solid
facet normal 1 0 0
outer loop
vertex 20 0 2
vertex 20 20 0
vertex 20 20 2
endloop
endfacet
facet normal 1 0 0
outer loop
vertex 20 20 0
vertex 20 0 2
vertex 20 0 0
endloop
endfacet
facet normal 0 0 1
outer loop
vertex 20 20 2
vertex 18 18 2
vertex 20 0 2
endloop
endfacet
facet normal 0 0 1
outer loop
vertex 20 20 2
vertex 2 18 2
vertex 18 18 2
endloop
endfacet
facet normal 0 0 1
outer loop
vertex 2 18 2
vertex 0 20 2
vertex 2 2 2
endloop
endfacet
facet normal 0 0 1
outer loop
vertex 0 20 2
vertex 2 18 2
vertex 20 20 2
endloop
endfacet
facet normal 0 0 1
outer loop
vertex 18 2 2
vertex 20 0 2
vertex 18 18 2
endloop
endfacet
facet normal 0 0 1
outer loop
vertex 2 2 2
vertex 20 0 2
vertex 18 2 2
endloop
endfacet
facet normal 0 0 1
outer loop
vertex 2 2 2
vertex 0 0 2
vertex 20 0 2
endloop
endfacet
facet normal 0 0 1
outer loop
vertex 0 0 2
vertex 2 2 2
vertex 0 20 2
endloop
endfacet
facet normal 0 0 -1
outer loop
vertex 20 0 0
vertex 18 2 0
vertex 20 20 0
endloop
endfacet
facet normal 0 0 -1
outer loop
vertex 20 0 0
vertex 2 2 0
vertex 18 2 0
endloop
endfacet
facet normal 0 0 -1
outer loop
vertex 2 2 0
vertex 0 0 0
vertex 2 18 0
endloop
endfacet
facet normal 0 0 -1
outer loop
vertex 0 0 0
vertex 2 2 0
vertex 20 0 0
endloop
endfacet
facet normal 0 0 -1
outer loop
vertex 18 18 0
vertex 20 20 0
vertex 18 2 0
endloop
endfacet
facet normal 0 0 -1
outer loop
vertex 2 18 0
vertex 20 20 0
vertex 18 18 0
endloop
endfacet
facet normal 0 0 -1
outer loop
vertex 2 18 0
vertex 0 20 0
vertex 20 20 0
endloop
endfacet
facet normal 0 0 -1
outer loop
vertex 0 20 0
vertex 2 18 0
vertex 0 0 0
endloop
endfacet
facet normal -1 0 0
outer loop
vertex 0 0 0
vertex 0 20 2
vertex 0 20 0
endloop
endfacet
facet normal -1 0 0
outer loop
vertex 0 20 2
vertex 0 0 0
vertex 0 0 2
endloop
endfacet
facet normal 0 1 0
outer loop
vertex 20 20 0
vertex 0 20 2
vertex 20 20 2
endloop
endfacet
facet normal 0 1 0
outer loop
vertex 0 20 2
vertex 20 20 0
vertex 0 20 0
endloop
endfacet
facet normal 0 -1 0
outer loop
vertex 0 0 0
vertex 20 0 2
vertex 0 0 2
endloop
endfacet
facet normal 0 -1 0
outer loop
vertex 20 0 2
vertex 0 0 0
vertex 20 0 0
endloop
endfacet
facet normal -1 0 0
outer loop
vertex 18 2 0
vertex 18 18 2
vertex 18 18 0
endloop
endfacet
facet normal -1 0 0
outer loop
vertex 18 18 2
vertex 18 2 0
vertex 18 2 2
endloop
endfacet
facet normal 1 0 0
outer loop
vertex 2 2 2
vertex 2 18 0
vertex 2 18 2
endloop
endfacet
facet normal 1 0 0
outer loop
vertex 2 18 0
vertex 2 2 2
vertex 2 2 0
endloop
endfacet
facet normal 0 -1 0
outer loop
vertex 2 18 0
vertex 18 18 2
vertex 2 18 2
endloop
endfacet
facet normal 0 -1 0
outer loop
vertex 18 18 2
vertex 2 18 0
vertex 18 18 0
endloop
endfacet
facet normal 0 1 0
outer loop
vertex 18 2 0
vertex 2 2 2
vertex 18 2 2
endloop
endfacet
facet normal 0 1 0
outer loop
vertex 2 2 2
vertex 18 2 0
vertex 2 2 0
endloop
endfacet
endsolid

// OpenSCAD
// Construct: module definition + instantiation using children().
module frame(t = 2) {
    difference() {
        cube([20, 20, t]);
        translate([t, t, -1]) children();
    }
}
frame() cube([16, 16, 10]);
